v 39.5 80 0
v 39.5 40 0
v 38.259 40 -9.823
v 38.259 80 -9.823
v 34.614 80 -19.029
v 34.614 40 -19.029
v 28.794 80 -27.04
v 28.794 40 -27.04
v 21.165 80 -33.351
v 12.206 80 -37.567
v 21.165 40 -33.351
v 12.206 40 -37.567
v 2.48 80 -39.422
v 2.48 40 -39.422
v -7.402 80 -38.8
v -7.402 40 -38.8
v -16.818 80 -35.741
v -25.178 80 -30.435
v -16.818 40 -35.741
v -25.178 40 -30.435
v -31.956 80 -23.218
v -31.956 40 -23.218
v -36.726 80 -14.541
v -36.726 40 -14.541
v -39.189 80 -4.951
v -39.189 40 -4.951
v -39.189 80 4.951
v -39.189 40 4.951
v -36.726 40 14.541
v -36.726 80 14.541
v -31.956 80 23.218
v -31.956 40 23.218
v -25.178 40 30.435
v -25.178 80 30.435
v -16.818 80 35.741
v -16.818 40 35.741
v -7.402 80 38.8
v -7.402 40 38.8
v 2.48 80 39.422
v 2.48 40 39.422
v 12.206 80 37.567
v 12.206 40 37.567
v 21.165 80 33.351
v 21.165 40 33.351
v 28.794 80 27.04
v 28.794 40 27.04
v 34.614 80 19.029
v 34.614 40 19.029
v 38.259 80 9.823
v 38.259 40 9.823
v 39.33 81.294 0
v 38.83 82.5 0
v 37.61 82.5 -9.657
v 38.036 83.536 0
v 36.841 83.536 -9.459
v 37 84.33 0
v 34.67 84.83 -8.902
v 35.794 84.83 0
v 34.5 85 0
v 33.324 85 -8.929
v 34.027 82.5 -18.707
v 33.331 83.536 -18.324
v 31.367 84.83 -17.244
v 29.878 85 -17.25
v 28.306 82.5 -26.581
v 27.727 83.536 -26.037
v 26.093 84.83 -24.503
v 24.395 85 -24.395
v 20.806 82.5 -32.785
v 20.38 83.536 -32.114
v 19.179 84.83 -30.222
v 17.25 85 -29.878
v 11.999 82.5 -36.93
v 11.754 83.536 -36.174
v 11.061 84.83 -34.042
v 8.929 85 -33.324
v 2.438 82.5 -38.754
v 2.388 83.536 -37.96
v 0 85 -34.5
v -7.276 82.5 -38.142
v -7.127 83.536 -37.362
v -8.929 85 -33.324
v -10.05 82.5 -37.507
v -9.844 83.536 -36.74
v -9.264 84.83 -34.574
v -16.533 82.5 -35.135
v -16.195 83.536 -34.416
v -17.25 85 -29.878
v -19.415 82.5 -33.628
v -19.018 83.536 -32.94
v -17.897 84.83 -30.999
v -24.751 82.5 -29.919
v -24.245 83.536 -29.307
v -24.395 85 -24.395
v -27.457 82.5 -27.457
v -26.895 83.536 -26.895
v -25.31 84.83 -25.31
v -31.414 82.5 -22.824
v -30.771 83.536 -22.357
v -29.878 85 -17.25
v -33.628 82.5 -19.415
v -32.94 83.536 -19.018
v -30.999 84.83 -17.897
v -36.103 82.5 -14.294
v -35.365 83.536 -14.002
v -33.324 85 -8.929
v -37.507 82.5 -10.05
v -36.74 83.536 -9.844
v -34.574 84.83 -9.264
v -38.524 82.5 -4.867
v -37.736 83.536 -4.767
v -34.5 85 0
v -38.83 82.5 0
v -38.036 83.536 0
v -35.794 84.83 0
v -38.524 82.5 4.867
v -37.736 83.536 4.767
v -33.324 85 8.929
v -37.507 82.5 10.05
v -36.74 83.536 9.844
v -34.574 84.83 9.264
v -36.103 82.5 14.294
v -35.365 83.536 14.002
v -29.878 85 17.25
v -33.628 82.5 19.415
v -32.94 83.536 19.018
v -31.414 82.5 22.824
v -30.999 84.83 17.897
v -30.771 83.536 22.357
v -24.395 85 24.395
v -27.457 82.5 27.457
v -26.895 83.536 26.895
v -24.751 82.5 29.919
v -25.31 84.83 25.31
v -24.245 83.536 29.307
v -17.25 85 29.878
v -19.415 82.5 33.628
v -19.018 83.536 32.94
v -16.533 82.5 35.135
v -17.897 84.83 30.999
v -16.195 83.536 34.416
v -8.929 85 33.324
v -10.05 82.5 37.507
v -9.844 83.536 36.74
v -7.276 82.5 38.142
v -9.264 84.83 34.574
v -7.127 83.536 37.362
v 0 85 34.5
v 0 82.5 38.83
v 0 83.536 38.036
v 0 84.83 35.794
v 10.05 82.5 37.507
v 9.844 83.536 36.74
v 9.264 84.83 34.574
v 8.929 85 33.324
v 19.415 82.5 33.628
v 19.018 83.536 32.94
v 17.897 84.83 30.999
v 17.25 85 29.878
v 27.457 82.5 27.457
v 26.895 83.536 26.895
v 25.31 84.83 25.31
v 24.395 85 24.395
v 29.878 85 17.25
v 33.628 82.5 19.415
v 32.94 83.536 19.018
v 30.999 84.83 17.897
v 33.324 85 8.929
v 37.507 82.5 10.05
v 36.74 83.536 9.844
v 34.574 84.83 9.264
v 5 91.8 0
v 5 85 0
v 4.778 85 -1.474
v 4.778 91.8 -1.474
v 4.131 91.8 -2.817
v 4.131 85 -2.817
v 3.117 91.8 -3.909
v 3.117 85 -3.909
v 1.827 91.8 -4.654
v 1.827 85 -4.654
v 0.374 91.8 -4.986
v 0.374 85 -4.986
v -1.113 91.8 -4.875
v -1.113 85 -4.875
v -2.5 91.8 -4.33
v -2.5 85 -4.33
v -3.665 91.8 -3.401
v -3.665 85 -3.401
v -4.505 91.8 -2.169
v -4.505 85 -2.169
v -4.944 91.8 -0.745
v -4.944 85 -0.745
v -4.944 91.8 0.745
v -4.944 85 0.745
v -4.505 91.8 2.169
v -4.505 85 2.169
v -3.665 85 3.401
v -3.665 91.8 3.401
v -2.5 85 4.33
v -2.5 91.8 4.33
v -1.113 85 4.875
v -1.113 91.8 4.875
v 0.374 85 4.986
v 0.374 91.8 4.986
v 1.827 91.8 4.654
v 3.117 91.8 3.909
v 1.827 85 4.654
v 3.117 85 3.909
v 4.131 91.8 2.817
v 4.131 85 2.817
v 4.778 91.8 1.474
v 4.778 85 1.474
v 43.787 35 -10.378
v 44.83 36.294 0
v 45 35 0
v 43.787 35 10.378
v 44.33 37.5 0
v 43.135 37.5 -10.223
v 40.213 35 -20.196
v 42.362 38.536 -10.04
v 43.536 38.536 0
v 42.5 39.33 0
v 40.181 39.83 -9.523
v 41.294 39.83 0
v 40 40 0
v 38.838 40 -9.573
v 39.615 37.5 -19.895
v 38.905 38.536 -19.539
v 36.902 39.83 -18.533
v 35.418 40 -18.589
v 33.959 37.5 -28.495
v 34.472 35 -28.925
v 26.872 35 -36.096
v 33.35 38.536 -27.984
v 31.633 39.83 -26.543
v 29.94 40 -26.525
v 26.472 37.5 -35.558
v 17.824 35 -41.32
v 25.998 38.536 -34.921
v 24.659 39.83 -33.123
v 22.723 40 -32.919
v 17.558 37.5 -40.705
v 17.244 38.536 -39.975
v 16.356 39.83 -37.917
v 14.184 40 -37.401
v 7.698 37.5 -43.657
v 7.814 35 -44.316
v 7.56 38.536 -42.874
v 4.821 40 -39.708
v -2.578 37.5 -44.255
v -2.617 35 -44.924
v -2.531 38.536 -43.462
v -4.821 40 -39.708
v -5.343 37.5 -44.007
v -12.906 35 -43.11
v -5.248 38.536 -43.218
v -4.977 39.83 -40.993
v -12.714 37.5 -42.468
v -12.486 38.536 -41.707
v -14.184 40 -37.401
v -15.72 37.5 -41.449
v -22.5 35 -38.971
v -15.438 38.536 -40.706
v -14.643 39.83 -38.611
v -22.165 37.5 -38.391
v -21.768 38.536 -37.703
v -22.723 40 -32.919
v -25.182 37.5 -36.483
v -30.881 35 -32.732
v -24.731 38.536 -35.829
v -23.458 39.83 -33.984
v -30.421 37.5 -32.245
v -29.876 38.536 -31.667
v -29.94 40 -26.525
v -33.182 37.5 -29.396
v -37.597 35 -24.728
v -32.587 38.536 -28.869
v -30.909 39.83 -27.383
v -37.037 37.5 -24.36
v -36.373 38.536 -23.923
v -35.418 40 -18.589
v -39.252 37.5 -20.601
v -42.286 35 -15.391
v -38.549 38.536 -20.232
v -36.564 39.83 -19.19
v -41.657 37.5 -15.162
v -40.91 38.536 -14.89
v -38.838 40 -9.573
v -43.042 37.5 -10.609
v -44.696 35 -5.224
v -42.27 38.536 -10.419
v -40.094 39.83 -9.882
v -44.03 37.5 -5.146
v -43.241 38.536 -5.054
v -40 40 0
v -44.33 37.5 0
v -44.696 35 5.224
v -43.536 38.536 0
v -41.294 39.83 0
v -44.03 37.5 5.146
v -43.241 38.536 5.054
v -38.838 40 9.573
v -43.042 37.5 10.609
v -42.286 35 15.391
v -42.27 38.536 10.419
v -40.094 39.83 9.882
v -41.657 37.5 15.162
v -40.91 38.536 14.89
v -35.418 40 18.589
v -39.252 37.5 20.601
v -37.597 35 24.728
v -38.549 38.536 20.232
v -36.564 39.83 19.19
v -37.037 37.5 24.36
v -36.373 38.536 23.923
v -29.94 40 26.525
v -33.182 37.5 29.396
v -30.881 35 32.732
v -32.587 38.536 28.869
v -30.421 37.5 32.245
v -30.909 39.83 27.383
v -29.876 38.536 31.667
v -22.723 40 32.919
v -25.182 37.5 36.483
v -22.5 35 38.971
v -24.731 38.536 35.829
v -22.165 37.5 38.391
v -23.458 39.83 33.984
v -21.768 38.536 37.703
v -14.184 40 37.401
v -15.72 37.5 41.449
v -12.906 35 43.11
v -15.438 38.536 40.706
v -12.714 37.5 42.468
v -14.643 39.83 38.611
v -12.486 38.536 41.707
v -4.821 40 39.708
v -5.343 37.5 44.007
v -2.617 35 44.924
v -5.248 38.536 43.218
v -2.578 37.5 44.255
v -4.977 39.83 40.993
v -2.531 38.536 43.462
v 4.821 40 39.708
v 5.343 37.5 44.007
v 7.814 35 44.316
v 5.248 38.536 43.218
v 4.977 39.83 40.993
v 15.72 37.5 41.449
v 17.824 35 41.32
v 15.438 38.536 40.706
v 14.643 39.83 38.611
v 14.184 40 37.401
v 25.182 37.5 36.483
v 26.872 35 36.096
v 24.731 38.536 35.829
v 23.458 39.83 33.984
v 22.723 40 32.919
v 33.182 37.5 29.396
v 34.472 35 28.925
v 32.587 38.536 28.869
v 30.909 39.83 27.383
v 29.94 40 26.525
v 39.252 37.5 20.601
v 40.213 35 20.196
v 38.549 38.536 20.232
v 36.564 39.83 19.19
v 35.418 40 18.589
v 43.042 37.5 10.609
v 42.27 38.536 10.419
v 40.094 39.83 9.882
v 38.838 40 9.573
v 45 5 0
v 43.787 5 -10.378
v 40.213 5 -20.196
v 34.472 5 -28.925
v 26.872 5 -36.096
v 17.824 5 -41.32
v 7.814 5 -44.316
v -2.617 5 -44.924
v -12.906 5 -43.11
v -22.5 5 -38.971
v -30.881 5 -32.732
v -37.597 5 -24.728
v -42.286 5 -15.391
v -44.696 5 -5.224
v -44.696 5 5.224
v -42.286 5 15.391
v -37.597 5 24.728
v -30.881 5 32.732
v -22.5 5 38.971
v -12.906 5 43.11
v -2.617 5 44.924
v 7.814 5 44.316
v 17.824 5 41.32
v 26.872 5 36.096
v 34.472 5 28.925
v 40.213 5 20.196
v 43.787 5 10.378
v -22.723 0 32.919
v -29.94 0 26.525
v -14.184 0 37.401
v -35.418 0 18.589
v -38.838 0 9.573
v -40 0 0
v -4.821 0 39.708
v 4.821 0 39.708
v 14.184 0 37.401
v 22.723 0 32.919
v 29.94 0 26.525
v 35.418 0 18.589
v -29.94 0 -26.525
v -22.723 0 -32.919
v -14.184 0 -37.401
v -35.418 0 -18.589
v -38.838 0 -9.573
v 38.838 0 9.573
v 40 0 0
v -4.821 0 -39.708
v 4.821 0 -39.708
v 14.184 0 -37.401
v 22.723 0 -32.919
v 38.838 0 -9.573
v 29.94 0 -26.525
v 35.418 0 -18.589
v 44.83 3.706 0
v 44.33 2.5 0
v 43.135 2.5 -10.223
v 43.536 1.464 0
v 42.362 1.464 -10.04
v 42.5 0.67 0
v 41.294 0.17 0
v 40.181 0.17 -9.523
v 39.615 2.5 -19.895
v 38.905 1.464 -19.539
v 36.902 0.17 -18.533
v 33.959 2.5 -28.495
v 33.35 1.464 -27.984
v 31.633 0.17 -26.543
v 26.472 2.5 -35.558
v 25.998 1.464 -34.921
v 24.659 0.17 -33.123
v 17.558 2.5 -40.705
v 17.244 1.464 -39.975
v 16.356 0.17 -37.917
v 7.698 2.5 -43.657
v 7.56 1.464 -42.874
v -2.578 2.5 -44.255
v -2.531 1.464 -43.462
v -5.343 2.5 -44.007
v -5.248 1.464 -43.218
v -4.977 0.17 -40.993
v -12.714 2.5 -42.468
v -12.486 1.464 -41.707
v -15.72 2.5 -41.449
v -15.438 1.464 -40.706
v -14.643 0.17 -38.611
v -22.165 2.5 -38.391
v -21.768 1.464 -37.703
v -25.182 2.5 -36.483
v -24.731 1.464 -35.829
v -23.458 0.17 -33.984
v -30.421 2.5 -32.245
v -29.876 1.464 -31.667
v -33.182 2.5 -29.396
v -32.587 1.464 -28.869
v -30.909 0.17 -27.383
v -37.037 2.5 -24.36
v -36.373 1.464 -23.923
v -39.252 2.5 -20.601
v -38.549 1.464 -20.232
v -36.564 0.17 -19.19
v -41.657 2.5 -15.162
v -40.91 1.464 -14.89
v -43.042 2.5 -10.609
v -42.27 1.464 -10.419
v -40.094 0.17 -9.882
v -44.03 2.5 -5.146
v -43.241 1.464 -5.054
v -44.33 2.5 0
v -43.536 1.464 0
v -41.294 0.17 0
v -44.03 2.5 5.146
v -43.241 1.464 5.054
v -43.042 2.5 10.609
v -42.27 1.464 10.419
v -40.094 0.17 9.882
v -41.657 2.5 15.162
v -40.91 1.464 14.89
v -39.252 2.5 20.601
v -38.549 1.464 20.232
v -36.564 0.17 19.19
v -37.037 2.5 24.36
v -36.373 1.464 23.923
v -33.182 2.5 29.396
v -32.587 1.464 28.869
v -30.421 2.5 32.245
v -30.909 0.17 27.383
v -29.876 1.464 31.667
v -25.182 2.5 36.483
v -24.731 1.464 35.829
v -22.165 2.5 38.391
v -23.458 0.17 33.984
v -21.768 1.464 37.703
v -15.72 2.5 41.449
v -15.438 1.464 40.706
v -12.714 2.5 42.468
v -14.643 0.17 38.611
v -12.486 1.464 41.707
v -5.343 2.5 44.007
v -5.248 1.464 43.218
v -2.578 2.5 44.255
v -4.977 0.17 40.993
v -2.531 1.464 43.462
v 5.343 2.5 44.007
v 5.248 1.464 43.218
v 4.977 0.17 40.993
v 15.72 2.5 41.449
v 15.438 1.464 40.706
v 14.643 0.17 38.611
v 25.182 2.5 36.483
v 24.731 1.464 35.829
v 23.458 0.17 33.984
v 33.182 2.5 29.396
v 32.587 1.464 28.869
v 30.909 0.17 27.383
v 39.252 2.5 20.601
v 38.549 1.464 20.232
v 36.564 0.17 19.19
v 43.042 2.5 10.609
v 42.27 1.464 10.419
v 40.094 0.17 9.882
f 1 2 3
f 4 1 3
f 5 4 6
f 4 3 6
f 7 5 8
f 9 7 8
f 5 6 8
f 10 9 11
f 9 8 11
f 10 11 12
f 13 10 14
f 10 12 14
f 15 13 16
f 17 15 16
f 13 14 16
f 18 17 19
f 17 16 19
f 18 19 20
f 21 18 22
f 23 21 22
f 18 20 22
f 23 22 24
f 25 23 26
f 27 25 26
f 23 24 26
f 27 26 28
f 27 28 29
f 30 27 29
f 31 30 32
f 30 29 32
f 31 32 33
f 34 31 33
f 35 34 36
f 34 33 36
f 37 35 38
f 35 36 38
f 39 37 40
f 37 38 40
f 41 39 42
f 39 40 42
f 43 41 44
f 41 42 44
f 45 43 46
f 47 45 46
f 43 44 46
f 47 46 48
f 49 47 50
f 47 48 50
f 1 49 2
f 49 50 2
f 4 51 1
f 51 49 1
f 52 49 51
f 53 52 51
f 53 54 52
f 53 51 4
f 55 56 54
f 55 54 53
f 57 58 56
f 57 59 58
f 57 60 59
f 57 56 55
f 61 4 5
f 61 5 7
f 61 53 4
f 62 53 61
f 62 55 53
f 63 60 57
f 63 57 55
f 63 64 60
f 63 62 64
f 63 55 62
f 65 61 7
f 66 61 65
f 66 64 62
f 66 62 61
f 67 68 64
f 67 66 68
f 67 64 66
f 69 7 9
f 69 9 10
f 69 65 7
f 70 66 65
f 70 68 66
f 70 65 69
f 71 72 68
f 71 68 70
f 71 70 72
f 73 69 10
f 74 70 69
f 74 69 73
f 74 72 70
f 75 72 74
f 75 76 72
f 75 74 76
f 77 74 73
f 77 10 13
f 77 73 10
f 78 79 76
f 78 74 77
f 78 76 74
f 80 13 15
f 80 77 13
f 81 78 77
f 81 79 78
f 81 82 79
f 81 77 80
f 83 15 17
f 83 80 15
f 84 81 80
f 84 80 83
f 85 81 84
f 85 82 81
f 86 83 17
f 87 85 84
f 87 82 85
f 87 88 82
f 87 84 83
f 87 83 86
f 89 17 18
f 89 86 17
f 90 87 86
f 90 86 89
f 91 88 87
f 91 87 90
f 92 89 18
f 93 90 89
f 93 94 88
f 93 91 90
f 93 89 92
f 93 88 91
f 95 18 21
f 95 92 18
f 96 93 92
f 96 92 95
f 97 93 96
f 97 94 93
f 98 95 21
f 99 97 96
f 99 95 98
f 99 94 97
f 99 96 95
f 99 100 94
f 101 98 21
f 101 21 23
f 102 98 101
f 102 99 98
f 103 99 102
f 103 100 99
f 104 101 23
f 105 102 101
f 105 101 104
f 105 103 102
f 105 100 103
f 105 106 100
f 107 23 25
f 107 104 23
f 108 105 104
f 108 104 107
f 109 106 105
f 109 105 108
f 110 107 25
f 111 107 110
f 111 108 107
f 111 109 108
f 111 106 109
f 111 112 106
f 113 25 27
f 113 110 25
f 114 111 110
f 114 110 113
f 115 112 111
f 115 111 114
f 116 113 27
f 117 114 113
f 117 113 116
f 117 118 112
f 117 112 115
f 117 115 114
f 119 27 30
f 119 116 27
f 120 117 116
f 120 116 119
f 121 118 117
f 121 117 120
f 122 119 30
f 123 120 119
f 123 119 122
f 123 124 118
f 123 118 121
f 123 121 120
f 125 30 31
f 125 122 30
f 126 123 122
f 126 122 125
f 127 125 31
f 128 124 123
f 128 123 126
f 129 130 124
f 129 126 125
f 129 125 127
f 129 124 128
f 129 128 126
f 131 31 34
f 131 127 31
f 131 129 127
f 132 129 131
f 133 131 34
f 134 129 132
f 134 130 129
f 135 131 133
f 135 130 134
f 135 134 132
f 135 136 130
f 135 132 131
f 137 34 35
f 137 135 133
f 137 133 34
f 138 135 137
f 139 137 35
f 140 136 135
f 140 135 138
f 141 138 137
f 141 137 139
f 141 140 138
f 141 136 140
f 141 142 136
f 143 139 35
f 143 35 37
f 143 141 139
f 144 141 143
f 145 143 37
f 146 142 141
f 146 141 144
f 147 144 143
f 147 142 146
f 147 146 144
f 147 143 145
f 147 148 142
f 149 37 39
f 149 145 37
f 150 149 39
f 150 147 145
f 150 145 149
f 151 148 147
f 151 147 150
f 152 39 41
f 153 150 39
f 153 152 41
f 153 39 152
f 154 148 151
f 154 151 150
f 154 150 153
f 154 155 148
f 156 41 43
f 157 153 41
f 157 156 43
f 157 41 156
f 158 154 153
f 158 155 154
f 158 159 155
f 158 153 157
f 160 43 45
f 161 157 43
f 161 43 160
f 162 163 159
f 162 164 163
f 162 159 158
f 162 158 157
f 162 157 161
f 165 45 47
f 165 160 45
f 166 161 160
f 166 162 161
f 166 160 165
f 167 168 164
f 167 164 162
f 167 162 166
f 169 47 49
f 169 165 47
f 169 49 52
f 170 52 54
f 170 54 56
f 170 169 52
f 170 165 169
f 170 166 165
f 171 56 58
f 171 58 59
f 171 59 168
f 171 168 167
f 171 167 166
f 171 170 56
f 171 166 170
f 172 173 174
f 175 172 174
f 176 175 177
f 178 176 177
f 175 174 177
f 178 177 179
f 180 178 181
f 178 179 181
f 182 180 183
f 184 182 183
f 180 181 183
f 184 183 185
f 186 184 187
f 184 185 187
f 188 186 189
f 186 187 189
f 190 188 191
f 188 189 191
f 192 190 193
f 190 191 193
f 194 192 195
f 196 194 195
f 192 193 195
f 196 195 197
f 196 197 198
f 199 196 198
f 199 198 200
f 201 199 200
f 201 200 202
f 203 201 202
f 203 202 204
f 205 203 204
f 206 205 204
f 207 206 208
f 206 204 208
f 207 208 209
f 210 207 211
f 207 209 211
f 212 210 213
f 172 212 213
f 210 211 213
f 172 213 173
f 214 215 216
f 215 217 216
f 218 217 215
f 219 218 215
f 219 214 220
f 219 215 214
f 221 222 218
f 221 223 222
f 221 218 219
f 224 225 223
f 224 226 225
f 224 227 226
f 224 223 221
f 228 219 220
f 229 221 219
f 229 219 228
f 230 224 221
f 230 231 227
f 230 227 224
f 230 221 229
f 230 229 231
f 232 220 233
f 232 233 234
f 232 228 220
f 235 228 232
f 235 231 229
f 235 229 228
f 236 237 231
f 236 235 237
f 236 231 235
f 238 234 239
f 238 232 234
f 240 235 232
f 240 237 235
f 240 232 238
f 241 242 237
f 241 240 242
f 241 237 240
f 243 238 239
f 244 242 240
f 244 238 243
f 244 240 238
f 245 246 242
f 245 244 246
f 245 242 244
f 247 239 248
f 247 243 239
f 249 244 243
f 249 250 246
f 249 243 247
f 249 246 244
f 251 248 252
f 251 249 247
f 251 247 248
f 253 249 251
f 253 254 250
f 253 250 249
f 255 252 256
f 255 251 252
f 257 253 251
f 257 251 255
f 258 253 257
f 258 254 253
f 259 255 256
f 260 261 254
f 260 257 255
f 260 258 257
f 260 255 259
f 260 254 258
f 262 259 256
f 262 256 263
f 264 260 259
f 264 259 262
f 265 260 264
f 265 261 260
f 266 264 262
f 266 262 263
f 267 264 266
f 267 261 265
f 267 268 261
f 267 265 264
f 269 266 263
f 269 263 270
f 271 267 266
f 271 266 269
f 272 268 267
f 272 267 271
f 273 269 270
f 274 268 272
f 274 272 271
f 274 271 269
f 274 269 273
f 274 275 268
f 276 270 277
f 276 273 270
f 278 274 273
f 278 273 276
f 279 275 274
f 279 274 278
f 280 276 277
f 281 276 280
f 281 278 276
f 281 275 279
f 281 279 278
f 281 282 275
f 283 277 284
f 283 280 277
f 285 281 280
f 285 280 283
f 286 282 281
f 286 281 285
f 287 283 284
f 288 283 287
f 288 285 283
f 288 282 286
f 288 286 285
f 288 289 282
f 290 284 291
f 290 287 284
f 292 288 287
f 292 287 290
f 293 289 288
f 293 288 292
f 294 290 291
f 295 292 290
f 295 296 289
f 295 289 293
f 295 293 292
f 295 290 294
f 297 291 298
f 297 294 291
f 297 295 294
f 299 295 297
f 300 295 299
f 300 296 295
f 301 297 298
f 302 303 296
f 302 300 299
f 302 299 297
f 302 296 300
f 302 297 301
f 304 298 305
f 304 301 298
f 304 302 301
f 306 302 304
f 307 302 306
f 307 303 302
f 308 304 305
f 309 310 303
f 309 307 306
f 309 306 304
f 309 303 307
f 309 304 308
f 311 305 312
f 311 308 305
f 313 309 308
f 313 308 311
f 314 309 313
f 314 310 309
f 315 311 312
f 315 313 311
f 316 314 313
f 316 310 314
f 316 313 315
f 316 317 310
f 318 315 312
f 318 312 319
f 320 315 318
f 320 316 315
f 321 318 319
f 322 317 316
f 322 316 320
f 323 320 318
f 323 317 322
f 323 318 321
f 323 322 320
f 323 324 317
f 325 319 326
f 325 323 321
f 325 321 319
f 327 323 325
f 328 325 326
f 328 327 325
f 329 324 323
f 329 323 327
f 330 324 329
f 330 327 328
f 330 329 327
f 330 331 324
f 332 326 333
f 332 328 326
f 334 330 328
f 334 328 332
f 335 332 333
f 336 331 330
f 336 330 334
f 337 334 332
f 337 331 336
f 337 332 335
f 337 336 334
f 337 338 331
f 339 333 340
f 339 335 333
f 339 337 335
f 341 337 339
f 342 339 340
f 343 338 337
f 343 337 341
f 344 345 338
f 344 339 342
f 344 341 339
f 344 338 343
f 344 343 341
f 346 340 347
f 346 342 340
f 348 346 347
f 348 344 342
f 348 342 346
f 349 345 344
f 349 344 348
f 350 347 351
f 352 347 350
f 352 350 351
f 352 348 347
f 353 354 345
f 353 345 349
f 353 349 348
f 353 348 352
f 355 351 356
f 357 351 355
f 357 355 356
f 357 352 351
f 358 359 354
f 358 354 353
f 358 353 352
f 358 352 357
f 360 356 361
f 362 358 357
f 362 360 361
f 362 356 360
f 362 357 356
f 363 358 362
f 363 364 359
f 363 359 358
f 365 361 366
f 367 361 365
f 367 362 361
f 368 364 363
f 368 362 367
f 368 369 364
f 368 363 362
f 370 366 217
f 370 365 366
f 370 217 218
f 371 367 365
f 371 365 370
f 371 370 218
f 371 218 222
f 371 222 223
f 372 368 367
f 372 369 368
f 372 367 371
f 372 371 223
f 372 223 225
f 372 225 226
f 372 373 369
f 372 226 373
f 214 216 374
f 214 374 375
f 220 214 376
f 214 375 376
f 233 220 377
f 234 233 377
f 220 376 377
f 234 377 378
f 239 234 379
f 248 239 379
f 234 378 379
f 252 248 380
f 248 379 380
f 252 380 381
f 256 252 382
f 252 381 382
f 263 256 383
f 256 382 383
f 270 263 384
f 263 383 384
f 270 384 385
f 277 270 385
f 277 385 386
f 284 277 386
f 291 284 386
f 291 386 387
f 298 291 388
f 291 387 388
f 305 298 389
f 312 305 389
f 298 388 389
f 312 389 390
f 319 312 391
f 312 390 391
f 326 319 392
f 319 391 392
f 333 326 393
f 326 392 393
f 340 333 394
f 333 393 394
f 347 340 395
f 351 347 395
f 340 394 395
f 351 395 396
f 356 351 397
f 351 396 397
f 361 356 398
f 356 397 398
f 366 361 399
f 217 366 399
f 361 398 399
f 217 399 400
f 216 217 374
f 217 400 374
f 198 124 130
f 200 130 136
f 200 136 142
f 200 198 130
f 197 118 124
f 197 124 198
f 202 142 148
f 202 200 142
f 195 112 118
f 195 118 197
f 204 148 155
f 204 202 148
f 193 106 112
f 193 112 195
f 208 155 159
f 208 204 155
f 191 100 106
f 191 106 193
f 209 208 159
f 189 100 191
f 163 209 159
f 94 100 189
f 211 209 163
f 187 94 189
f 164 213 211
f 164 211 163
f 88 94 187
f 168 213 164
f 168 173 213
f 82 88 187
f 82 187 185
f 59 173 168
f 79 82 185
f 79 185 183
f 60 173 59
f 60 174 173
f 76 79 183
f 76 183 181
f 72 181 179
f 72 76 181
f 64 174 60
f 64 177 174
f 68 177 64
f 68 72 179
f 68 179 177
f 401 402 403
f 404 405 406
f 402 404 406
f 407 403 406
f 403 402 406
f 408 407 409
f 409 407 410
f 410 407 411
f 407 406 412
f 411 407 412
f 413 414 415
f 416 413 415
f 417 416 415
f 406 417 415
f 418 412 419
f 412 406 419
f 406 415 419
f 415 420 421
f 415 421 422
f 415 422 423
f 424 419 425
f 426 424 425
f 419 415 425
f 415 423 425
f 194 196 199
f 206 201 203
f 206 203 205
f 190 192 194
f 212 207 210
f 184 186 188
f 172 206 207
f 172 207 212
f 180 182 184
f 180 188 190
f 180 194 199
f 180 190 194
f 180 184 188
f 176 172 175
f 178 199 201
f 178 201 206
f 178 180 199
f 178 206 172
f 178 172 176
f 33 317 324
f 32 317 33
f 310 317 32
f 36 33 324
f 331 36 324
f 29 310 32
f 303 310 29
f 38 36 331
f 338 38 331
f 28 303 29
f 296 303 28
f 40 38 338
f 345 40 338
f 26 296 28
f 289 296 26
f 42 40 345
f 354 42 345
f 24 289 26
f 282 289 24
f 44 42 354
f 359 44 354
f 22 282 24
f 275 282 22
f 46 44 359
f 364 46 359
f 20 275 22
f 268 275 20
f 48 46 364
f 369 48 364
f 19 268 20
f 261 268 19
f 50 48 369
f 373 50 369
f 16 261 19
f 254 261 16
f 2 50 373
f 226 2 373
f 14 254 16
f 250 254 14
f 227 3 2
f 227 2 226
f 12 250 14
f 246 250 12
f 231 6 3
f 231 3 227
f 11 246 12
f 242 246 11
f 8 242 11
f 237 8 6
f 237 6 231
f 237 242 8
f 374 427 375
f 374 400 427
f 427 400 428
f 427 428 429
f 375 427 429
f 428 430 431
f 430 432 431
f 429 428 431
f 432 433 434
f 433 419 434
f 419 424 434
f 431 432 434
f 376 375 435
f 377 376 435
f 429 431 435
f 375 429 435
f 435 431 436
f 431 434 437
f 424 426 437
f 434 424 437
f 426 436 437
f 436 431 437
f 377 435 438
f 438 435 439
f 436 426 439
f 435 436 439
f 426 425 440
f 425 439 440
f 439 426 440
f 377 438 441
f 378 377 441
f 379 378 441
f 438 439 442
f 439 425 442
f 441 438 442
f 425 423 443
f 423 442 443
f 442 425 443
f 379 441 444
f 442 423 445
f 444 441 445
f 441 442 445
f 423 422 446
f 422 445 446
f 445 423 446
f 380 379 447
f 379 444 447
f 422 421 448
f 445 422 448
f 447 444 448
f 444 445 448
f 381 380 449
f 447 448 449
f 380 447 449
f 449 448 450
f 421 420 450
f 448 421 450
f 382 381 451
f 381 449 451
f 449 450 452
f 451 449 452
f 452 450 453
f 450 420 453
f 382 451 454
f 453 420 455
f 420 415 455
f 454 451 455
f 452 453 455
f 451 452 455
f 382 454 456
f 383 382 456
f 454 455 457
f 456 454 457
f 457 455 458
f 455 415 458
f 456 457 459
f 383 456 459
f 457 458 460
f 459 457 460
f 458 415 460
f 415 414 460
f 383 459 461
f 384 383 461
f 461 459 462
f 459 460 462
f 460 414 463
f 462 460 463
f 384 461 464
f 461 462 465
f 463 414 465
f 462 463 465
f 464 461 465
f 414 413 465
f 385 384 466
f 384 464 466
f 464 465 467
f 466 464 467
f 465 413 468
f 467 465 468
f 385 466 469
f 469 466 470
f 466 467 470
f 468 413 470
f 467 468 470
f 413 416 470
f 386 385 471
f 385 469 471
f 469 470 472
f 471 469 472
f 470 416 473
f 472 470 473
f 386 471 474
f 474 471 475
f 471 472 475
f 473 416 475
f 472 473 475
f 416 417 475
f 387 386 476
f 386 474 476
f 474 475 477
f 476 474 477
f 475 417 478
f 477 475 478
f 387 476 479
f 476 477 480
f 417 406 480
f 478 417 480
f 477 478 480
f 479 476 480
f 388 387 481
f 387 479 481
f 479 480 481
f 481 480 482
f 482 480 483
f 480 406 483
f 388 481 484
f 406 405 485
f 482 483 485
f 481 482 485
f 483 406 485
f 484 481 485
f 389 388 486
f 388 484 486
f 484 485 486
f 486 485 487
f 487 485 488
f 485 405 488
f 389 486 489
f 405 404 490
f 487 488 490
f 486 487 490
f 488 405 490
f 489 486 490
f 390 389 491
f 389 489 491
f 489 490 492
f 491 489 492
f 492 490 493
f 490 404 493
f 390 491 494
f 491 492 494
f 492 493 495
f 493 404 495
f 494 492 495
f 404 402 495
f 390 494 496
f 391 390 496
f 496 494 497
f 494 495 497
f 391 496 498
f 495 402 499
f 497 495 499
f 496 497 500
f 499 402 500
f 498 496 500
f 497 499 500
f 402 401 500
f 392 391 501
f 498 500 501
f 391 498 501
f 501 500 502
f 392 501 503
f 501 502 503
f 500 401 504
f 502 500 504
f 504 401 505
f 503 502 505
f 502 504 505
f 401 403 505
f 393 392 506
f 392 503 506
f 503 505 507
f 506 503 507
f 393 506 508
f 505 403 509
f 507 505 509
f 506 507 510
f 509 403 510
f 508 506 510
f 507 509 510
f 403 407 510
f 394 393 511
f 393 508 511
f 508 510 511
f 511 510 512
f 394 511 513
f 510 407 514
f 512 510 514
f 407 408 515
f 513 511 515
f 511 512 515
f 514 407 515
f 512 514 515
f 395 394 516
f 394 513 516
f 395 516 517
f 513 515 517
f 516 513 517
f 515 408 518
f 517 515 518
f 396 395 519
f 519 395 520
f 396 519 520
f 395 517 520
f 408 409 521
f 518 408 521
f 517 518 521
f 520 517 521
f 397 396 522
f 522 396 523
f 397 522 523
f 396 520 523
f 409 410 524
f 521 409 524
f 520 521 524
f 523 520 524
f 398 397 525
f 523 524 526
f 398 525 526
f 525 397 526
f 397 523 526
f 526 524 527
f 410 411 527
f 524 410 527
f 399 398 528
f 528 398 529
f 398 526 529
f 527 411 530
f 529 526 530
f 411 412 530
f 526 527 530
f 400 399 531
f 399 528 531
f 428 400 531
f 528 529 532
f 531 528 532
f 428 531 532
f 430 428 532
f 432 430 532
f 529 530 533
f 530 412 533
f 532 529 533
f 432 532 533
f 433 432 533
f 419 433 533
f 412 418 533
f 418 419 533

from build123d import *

# Parameters (mm, degrees)
SKETCH1_R           = 45
BOSS_EXTRUDE1_DEPTH = 40
SKETCH2_R           = 39.5
BOSS_EXTRUDE2_DEPTH = 45
SKETCH3_R           = 5
BOSS_EXTRUDE3_DEPTH = 6.8
FILLET1_R           = 5


with BuildPart() as part:
    # Sketch1 → Boss-Extrude1 (new body)
    with BuildSketch(Plane(origin=(0, 0, 0), x_dir=(1, 0, 0), z_dir=(0, 1, 0))):
        Circle(SKETCH1_R)
    extrude(amount=BOSS_EXTRUDE1_DEPTH)

    # Sketch2 → Boss-Extrude2 (add)
    with BuildSketch(Plane(origin=(0, 40, 0), x_dir=(1, 0, 0), z_dir=(0, 1, 0))):
        Circle(SKETCH2_R)
    extrude(amount=BOSS_EXTRUDE2_DEPTH)

    # Sketch3 → Boss-Extrude3 (add)
    with BuildSketch(Plane(origin=(0, 85, 0), x_dir=(1, 0, 0), z_dir=(0, 1, 0))):
        Circle(SKETCH3_R)
    extrude(amount=BOSS_EXTRUDE3_DEPTH)

    # Fillet1
    fillet1_edges = [part.edges().sort_by_distance(p)[0] for p in [
        (-45, 0, 0),
        (-45, 40, 0),
        (-39.5, 85, 0),
    ]]
    fillet(fillet1_edges, radius=FILLET1_R)


solid = part.part
